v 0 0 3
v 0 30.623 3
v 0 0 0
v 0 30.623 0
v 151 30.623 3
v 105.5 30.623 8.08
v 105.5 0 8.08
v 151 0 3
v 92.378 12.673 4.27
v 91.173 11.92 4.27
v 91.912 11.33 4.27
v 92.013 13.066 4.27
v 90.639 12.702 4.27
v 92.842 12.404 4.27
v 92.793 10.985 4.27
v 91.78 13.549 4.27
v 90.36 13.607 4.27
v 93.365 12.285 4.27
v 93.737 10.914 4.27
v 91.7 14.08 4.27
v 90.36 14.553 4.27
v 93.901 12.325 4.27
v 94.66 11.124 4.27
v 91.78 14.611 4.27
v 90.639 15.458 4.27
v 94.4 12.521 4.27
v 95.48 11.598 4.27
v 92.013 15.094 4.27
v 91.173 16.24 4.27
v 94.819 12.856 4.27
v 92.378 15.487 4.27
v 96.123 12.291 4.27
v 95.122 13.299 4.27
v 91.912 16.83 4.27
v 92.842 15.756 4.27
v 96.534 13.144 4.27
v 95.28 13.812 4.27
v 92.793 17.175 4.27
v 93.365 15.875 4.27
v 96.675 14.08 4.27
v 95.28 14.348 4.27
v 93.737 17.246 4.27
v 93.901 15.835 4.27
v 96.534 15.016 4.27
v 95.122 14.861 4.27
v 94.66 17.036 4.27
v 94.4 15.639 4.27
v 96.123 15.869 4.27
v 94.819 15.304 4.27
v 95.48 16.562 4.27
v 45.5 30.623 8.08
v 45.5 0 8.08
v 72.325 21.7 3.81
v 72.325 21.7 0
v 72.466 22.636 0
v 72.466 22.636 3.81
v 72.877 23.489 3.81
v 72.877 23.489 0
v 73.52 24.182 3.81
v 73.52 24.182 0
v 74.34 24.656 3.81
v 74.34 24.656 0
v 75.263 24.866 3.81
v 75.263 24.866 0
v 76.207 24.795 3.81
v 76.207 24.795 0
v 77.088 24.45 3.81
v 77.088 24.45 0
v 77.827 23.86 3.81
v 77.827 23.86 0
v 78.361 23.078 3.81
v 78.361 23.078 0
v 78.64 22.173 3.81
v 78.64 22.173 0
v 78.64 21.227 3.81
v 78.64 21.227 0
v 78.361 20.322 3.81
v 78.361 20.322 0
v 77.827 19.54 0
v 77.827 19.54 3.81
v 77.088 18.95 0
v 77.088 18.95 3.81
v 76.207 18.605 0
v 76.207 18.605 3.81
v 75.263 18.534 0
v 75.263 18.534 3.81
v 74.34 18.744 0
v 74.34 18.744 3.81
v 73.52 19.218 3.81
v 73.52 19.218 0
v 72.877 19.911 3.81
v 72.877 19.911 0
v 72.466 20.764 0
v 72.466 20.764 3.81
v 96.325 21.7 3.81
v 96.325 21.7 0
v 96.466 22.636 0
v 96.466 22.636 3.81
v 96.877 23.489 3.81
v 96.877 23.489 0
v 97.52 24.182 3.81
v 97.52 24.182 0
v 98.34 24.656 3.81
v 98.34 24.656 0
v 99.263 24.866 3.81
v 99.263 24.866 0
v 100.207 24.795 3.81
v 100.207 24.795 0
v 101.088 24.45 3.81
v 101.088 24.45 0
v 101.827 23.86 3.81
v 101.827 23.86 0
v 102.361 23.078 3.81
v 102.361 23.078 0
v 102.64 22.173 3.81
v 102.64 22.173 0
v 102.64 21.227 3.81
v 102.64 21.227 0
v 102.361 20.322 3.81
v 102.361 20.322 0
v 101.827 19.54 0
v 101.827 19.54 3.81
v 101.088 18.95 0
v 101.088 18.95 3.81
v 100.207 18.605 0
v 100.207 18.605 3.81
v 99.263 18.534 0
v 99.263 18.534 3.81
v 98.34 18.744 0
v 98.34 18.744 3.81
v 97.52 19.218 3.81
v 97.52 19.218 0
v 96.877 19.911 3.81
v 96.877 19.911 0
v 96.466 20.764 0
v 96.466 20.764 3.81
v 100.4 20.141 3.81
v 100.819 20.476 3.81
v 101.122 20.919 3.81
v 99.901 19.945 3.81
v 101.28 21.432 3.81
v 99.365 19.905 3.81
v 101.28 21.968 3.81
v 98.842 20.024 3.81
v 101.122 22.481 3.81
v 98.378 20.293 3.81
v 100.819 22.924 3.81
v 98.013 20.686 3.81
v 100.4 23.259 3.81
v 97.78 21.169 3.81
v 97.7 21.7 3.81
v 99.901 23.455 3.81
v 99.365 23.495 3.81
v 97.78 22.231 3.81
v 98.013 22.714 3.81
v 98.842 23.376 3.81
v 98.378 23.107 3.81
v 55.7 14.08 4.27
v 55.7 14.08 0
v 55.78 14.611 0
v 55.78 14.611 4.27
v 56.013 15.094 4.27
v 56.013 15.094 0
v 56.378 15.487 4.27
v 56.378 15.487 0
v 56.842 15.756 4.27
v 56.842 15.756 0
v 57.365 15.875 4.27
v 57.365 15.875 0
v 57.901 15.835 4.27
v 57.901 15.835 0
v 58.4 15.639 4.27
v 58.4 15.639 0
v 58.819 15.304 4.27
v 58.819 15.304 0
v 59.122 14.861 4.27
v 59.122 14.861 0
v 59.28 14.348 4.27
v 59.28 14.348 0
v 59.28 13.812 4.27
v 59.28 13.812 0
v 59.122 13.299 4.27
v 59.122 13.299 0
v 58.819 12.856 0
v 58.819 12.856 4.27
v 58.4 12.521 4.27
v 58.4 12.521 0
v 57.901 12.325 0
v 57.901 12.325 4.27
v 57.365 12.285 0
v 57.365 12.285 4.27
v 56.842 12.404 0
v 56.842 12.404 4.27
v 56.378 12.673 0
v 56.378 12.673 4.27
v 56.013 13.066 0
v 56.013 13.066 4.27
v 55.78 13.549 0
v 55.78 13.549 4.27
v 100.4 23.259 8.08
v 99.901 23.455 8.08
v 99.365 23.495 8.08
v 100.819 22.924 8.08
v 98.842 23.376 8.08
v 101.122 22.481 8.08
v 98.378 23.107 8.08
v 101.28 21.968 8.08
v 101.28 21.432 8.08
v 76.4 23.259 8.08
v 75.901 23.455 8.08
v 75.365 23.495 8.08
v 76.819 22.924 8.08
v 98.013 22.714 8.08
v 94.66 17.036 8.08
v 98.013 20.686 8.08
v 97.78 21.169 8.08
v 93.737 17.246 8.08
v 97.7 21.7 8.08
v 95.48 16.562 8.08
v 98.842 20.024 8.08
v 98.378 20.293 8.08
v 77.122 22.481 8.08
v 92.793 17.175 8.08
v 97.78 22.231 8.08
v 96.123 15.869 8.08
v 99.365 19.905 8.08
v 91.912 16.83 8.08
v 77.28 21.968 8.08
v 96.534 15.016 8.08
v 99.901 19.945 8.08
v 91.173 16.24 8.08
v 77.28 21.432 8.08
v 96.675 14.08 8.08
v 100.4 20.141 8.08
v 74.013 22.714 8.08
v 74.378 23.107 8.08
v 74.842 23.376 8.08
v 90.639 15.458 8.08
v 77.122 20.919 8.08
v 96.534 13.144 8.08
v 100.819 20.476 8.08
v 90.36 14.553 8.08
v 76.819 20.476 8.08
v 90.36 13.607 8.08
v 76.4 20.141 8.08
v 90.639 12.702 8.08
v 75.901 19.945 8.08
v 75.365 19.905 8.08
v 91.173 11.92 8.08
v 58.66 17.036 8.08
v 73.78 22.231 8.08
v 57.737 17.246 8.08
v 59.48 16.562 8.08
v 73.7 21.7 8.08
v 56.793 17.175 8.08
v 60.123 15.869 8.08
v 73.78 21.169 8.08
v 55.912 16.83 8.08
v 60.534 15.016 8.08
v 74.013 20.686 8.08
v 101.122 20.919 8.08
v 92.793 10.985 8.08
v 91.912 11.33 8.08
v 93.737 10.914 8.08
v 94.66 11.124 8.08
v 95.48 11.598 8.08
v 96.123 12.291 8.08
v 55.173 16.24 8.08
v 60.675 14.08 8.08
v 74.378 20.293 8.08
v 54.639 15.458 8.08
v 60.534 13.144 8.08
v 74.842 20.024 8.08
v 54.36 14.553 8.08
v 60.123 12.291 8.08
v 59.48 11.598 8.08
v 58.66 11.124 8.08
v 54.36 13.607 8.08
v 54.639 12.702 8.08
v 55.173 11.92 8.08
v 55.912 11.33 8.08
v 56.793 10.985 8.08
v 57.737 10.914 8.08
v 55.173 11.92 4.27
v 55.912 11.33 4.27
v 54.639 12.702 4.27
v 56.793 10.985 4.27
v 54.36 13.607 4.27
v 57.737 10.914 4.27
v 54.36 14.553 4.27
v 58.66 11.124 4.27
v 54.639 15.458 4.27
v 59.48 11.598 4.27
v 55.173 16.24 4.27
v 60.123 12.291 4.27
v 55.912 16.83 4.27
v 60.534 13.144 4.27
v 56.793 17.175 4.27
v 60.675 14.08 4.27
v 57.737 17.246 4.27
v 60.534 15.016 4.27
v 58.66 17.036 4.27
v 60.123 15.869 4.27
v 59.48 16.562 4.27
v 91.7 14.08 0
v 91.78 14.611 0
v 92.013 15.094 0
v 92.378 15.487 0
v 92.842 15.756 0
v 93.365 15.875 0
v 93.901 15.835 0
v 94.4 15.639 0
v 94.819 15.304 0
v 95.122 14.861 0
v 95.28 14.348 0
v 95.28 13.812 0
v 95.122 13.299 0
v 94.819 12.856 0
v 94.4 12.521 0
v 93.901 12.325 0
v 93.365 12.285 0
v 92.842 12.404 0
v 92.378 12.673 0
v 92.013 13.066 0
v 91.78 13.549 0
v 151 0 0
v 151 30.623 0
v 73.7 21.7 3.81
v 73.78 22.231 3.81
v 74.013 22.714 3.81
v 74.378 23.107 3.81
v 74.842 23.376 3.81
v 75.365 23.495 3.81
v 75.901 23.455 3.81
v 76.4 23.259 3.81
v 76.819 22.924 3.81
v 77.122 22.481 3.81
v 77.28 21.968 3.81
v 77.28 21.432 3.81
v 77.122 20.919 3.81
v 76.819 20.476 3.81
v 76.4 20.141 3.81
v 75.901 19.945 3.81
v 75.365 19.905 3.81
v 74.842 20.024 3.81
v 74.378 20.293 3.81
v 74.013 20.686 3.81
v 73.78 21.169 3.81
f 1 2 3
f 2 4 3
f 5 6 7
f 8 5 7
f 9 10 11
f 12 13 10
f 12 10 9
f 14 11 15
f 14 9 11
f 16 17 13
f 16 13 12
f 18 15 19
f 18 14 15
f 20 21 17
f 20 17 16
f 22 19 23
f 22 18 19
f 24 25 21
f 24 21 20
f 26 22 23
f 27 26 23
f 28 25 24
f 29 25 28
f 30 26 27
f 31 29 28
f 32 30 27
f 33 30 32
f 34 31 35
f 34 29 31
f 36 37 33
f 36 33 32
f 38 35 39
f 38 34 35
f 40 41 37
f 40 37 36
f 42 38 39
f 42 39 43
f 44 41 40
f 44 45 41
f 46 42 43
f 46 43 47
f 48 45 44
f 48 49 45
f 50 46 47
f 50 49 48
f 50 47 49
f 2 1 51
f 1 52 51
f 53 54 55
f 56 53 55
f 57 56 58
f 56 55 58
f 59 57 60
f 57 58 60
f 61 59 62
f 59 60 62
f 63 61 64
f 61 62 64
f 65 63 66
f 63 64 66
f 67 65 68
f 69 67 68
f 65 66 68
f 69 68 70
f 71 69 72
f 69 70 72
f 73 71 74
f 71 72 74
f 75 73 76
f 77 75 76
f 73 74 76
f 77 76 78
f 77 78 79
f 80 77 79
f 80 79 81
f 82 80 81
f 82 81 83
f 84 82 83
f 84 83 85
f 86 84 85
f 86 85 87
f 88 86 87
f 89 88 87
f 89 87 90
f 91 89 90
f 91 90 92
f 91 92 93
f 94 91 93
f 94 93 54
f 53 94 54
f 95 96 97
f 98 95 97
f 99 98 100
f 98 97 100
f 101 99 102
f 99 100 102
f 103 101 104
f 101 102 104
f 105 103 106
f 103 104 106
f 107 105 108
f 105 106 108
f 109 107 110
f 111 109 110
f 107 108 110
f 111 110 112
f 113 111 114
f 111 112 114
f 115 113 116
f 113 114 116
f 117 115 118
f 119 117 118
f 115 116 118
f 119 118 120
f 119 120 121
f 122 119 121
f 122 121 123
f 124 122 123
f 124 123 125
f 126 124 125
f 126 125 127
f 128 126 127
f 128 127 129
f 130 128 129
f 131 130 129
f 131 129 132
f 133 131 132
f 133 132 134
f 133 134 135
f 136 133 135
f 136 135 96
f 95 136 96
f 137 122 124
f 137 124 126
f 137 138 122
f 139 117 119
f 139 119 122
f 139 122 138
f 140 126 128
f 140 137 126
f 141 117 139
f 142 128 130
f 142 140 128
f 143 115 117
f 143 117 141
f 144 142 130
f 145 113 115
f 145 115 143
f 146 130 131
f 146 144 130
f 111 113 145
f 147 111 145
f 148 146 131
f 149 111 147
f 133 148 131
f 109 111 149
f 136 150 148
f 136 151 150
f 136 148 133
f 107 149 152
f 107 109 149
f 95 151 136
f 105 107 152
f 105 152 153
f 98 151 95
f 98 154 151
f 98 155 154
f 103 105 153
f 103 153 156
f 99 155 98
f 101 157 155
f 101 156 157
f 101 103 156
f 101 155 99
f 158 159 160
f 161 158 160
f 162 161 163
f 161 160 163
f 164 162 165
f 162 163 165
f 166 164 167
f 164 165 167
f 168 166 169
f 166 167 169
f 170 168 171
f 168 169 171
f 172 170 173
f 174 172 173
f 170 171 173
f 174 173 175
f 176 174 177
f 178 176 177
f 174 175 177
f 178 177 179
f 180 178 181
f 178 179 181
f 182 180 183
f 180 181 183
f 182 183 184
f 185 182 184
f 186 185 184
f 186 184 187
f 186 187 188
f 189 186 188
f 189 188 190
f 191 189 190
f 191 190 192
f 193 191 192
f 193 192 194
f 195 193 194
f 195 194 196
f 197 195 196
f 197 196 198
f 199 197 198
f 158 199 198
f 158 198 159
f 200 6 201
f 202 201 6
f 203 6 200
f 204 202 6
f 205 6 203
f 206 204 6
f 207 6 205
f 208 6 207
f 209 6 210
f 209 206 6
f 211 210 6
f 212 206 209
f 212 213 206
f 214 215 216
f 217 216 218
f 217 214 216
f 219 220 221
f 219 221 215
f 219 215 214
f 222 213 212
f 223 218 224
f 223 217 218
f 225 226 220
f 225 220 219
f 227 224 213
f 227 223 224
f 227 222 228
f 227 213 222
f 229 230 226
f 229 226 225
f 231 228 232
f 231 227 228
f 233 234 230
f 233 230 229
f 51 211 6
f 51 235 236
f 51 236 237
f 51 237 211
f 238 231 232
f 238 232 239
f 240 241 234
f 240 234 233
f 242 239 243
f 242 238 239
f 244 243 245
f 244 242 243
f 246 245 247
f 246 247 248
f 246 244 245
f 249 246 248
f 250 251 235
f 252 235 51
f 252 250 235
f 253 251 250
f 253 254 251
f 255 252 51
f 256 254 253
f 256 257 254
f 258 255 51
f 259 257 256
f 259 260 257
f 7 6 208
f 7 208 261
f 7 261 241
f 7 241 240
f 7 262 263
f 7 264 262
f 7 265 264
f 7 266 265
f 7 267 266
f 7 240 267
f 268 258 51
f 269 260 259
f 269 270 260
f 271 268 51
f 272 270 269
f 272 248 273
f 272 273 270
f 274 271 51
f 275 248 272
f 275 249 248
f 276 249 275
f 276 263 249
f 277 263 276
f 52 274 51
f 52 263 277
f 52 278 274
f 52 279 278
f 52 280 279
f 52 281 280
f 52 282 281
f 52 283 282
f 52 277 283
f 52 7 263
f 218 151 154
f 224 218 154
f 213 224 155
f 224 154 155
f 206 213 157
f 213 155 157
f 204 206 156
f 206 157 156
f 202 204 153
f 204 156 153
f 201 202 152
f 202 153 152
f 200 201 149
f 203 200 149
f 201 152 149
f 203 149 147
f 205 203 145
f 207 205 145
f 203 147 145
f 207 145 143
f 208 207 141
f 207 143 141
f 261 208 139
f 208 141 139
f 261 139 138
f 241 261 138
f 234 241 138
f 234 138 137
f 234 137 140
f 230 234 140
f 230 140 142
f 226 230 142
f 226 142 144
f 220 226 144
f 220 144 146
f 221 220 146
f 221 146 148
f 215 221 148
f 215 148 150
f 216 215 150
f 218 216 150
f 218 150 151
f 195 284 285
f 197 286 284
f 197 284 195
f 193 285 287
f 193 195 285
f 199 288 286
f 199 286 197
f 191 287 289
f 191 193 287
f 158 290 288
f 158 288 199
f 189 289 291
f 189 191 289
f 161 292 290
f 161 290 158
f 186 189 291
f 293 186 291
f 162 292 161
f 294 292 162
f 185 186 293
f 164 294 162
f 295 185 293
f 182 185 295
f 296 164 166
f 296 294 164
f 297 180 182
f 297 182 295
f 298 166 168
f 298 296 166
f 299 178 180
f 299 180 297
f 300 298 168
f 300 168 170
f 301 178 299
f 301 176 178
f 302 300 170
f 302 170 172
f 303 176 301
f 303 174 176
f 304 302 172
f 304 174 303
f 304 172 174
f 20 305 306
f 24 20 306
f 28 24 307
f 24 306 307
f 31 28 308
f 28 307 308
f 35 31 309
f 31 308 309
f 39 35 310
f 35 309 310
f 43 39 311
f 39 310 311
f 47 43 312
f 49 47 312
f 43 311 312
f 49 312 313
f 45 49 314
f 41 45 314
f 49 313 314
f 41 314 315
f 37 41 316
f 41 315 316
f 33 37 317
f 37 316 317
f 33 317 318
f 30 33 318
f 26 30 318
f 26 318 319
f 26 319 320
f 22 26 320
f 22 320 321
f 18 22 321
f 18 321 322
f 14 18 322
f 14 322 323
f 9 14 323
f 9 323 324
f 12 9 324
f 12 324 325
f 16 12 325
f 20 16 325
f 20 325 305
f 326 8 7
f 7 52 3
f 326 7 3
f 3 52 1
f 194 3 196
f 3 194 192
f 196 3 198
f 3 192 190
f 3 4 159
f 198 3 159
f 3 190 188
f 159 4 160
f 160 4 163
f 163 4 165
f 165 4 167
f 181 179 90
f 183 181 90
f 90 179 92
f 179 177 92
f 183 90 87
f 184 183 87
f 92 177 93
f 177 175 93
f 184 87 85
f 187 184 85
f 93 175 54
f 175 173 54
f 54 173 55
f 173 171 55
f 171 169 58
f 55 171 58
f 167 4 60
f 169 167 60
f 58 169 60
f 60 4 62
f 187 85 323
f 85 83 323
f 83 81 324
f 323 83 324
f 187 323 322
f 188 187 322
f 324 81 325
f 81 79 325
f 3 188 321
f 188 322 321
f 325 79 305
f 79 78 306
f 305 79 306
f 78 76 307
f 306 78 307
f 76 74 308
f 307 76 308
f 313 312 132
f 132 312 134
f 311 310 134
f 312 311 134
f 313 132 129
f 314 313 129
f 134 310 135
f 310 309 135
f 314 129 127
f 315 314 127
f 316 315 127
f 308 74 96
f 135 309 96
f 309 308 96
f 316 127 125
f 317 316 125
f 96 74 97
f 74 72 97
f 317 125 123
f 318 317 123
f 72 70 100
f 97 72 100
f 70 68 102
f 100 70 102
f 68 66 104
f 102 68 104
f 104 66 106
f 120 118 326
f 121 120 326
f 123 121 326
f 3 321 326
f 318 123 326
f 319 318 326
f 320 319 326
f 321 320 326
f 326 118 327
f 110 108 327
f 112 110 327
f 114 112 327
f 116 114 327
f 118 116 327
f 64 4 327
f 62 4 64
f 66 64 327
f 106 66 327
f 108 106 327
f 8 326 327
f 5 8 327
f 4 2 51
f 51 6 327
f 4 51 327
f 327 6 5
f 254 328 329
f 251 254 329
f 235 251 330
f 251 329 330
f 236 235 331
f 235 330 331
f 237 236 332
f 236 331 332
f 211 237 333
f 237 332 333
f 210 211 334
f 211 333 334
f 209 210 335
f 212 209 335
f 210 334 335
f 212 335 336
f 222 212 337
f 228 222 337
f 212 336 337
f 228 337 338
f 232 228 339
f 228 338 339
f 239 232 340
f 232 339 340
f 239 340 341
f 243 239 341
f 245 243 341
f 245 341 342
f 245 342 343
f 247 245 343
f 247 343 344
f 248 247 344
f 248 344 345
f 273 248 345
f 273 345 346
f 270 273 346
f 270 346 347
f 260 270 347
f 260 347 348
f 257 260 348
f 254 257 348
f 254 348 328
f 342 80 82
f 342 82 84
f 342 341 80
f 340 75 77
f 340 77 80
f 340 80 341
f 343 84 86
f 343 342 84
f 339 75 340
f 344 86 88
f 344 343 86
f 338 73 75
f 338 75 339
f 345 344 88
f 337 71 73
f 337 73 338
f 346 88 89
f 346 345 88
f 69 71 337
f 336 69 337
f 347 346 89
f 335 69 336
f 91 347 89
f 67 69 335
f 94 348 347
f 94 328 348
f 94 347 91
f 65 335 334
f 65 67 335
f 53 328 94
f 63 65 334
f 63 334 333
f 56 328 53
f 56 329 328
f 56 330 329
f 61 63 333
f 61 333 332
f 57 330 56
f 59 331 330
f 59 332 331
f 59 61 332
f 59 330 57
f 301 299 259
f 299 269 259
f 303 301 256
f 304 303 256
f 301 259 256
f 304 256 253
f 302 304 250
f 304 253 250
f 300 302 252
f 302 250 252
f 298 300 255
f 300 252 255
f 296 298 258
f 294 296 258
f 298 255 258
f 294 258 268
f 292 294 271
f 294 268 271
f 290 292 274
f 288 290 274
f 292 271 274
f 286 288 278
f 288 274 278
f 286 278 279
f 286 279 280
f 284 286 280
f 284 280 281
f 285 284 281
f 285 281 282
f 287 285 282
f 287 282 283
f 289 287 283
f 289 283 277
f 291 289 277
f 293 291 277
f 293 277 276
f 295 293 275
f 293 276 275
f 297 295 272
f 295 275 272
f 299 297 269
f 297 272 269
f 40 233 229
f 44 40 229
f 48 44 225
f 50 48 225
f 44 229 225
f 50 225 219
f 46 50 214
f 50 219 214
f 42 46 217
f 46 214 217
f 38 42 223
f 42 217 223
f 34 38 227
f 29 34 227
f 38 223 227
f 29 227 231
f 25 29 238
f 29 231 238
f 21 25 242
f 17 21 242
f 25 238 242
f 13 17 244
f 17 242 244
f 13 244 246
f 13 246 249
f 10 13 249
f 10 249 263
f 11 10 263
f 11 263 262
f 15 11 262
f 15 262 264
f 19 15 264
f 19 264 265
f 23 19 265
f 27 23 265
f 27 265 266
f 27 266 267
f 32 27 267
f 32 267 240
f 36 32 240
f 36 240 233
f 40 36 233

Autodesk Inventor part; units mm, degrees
ref_plane "YZ Plane" through (0, 0, 0) normal (1, 0, 0) x (0, 1, 0)
ref_plane "XZ Plane" through (0, 0, 0) normal (0, 1, 0) x (-1, 0, 0)
sketch "Sketch1" plane through (0, 0, 0) normal (0, 0, 1) x (1, 0, 0)
  line L0 (0, 0) -> (151, 0)
  line L1 (151, 0) -> (151, 30.623)
  line L2 (151, 30.623) -> (0, 30.623)
  line L3 (0, 30.623) -> (0, 0)
  dimension "d0" = 151
  dimension "d1" = 30.623
extrude "Extrusion1" add sketch "Sketch1" along normal blind 3
ref_plane "Work Plane2" through (0, 0, 8.08) normal (0, 0, 1) x (1, 0, 0)
sketch "Sketch2" plane through (0, 0, 8.08) normal (0, 0, 1) x (1, 0, 0)
  line L0 (151, 0) -> (151, 30.623) construction
  line L1 (151, 30.623) -> (0, 30.623) construction
  line L2 (0, 30.623) -> (0, 0) projected
  line L3 (0, 0) -> (151, 0) construction
  line L4 (45.5, 30.623) -> (105.5, 30.623)
  line L5 (105.5, 30.623) -> (105.5, 0)
  line L6 (105.5, 0) -> (45.5, 0)
  line L7 (45.5, 0) -> (45.5, 30.623)
  line L8 (45.5, 15.3115) -> (0, 15.3115) construction
  line L9 (105.5, 15.3115) -> (151, 15.3115) construction
  dimension "d6" = 60
loft "Loft1" add profiles "Sketch2" section 1 edges at (151, 15.3115, 3) (75.5, 30.623, 3) (0, 15.3115, 3) (75.5, 0, 3)
sketch "Sketch7" plane through (0, 0, 0) normal (0, 0, -1) x (-1, 0, 0)
  circle A0 centre (-93.5, 14.08) radius 1.8
  circle A1 centre (-57.5, 14.08) radius 1.8
  line L0 (0, 0) -> (-151, 0) projected
  line L1 (-151, 0) -> (-151, 30.623) projected
  line L2 (0, 30.623) -> (0, 0) projected
  dimension "d25" = 14.08
  dimension "d26" = 14.08
  dimension "d27" = 57.5
  dimension "d28" = 3.6
  dimension "d29" = 57.5
  dimension "d30" = 3.6
extrude "Extrusion4" cut sketch "Sketch7" along normal mid plane 225.25
sketch "Sketch8" plane through (45.5, 30.623, 8.08) normal (0, 0, 1) x (1, 0, 0)
  circle A0 centre (48, -16.543) radius 1.8 projected
  circle A1 centre (12, -16.543) radius 1.8 projected
  line L0 (60, 0) -> (60, -30.623) projected
  line L1 (0, 0) -> (60, 0) projected
  line L2 (0, -30.623) -> (0, 0) projected
  line L3 (60, -30.623) -> (0, -30.623) projected
  circle A2 centre (12, -16.543) radius 3.175
  circle A3 centre (48, -16.543) radius 3.175
  point P0 (-45.5, -30.623)
  dimension "d33" = 6.35
  dimension "d34" = 6.35
extrude "Extrusion5" cut sketch "Sketch8" against normal blind 3.81 contours A0 | A1 | A2 | A3
sketch "Sketch9" plane through (0, 0, 0) normal (0, 0, -1) x (-1, 0, 0)
  circle A0 centre (-75.5, 21.7) radius 1.8
  circle A1 centre (-99.5, 21.7) radius 1.8
  circle A2 centre (-93.5, 14.08) radius 1.8 projected
  circle A3 centre (-57.5, 14.08) radius 1.8 projected
  line L0 (-151, 0) -> (-151, 30.623) projected
  line L1 (0, 0) -> (-151, 0) projected
  line L2 (0, 30.623) -> (0, 0) projected
  line L3 (-151, 30.623) -> (0, 30.623) projected
  line L4 (-75.5, 21.7) -> (-75.5, 0) construction
  line L5 (-75.5, 21.7) -> (-99.5, 21.7) construction
  dimension "d37" = 3.6
  dimension "d38" = 3.6
  dimension "d40" = 24
  dimension "d43" = 7.62
extrude "Extrusion6" cut sketch "Sketch9" along normal mid plane 73.66 contours A0 | A1
sketch "Sketch11" plane through (0, 0, 0) normal (0, 0, -1) x (-1, 0, 0)
  circle A0 centre (-99.5, 21.7) radius 1.8 projected
  circle A1 centre (-75.5, 21.7) radius 1.8 projected
  circle A2 centre (-93.5, 14.08) radius 1.8 projected
  circle A3 centre (-57.5, 14.08) radius 1.8 projected
  line L0 (-151, 0) -> (-151, 30.623) projected
  line L1 (0, 0) -> (-151, 0) projected
  line L2 (0, 30.623) -> (0, 0) projected
  line L3 (-151, 30.623) -> (0, 30.623) projected
  circle A4 centre (-75.5, 21.7) radius 3.175
  circle A5 centre (-99.5, 21.7) radius 3.175
  dimension "d44" = 6.35
  dimension "d45" = 6.35
extrude "Extrusion7" cut sketch "Sketch11" against normal blind 3.81 contours A0 | A1 | A4 | A5
properties part number "ZED_mount_V2_3DPrint"
